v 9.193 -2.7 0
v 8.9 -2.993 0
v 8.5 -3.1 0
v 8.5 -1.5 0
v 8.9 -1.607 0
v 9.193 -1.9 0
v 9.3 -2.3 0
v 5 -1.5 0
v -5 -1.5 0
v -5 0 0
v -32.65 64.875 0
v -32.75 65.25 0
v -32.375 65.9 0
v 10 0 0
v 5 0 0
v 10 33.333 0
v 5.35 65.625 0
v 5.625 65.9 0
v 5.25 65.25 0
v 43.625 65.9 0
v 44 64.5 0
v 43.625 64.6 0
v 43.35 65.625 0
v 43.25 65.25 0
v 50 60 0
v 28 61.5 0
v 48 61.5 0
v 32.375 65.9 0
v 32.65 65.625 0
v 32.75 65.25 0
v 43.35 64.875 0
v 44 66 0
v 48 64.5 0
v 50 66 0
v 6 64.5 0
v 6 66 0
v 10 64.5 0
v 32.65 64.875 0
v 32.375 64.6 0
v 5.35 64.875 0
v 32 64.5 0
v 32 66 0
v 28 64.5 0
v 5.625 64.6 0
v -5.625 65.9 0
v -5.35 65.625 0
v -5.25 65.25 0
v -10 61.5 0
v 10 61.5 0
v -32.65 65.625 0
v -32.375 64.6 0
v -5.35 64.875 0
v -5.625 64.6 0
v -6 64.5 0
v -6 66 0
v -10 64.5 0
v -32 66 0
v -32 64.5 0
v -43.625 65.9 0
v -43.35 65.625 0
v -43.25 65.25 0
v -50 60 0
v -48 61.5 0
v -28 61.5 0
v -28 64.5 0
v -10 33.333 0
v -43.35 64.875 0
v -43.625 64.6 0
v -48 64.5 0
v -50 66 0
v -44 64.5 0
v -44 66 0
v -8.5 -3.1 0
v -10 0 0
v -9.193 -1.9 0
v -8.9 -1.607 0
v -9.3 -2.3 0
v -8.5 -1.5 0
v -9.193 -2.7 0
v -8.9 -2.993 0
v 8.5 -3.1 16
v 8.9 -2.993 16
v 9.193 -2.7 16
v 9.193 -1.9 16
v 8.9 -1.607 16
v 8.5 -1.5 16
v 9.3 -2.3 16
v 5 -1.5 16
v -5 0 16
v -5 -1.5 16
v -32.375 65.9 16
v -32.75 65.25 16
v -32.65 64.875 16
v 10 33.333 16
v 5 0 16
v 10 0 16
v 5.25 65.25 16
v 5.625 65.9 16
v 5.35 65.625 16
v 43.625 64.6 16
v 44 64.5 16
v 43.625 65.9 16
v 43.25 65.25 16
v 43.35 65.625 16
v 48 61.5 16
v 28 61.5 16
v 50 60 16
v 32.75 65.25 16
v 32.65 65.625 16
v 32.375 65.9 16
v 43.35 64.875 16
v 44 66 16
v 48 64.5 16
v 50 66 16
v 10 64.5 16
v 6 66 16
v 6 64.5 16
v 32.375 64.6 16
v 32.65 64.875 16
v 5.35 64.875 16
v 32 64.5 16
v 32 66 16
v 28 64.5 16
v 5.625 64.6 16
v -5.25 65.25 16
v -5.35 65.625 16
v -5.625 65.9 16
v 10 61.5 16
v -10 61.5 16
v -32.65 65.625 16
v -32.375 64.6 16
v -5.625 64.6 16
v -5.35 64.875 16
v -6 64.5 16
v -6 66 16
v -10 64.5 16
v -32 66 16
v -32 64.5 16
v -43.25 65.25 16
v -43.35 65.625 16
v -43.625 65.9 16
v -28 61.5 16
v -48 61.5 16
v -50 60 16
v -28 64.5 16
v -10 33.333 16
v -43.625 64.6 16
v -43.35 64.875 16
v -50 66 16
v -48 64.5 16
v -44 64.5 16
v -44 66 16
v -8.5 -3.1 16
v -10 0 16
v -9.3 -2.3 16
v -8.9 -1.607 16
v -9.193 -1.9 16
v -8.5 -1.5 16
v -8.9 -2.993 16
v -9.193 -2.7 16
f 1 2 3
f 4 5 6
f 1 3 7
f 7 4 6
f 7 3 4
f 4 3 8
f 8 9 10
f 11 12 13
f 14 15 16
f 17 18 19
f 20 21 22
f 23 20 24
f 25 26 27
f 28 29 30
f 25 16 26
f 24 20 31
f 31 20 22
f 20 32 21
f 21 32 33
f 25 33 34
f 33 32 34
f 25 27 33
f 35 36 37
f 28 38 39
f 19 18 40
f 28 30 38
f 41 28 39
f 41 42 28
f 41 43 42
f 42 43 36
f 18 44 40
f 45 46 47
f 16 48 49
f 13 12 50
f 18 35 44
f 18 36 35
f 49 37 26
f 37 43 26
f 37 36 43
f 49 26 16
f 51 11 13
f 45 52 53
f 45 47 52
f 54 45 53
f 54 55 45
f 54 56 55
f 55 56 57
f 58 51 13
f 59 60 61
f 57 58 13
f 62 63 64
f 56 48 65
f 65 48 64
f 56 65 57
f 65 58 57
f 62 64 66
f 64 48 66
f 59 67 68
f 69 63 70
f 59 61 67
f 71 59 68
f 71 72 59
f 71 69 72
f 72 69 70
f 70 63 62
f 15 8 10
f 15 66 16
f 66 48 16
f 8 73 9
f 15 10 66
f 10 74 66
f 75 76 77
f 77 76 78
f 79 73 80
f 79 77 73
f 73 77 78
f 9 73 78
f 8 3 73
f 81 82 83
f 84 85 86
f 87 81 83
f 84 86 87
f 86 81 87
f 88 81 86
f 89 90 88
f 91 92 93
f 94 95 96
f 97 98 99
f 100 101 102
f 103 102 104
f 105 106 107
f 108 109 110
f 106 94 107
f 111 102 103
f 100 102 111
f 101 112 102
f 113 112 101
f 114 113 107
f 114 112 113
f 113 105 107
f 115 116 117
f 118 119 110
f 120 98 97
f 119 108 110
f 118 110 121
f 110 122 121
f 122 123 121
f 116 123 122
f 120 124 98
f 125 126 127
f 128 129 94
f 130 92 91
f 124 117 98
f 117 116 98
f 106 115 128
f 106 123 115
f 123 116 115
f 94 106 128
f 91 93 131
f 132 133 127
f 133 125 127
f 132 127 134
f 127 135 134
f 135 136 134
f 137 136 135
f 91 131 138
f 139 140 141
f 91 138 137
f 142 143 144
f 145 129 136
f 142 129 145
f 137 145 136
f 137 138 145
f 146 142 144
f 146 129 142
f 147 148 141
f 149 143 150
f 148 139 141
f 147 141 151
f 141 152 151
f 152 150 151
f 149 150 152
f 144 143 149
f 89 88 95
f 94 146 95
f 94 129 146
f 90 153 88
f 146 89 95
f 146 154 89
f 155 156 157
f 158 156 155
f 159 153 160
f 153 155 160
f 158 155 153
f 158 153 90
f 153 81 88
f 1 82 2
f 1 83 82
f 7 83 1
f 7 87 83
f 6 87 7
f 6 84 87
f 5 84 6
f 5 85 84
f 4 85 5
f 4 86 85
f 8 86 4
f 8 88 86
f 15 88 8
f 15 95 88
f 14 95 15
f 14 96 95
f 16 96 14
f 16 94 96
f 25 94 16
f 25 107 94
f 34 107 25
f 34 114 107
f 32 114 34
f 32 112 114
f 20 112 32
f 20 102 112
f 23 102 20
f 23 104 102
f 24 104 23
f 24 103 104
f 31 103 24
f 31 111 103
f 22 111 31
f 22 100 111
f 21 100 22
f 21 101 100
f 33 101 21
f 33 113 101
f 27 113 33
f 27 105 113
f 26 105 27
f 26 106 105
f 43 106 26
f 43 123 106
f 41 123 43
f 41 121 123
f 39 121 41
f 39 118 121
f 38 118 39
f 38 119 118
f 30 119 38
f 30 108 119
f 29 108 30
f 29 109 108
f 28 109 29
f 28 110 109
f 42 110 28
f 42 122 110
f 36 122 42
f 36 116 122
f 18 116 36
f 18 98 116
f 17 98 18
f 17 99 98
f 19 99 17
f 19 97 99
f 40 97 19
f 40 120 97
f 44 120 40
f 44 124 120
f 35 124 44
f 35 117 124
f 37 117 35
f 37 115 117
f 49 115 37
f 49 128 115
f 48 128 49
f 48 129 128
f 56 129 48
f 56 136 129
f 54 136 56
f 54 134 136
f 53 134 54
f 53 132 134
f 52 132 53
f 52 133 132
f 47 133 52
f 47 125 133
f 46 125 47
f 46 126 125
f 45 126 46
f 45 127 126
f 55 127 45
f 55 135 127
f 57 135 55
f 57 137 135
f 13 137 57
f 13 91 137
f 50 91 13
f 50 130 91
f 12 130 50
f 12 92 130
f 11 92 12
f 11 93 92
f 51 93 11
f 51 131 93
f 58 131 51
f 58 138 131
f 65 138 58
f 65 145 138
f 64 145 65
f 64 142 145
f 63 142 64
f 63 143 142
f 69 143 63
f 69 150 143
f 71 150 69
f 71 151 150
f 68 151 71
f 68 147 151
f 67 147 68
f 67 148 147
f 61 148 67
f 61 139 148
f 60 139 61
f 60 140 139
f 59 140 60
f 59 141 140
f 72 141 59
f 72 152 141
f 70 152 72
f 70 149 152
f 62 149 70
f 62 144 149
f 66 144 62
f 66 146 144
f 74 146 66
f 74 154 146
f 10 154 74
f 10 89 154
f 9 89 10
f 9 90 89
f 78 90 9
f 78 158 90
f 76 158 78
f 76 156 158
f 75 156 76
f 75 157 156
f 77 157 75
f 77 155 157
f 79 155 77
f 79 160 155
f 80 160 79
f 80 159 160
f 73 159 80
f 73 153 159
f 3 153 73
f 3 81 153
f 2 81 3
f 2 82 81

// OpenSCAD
shi=16;
shoesize=[20,20];
tallboy(60);
module tallboy(h=160) {
  linear_extrude(shi,convexity=3) {
    mirror([0,1]) translate([0,-16.5,0]) male();
    translate([-10,0]) square([20,h]);
    translate([0,h]) difference() {
      hull() {
        translate([-50,0]) square([100,6]);
        translate([-5,-30]) square([10,5]);
      }
      translate([0,1.5]) female2();
      for(m=[0,1]) mirror([m,0]) translate([-38,1.5]) female2();
    }
  }
}
module double() {
  difference() {
    linear_extrude(shi,convexity=3) {
      difference(){
        union() {
          translate([0,12]) mirror([0,1]) male();
          hull() {
            rotate([0,0,30]) translate([12,-12]) square([6.5,24]);
            rotate([0,0,150]) translate([12,-12]) square([6.5,24]);
          }
        }
        translate([-7,-2]) square([14,8]);
        rotate([0,0,30]) translate([4,0]) female();
        rotate([0,0,150]) translate([4,0]) female();
      }
    }
    translate([0,30,shi/2]) rotate([90,0]) cylinder(d=25.4/4,h=60,$fn=30);
  }
}
module triple() {
difference() {
  linear_extrude(shi,convexity=3)
  difference() {
    union() {
      intersection() {
        circle(d=40,$fn=36);
        translate([-16,-16]) square([32,32]);
      }
      male();
    }
    for(r=[0,180]) rotate([0,0,r]) translate([1.5,0]) {
      female();
    }
    translate([-9,-12]) square([18,25]);
  }
  translate([0,30,shi/2]) rotate([90,0]) cylinder(d=25.4/4,h=60,$fn=30);
}
}
module male() {
  translate([-5,16]) square([10,2]);
  translate([-8.5,18.8]) hull() {
    circle(d=1.6,$fn=12);
    translate([17,0]) circle(d=1.6,$fn=12);
    *square([18,1.6]);
  }
}
module female2() {
  rotate([0,0,90]) translate([-10,0]) female();
}
module female() {
  difference() {
    translate([10,-6]) square([5.1,12]);
    translate([13.75,-6]) circle(d=1.5,$fn=12);
    translate([13.75,6]) circle(d=1.5,$fn=12);
  }
    hull() {
      translate([11,-8]) intersection() {
        *for(y=[-1,17]) translate([0,y])
          circle(r=1,$fn=20);
        translate([-1,-2]) square([1,20]);
      }
      translate([11,-10]) square([2,20]);
    }
}
/*
difference() {
  cube([200,30,3]);
  for(x=[8,172]) translate([x,-.01,-.01]) cube([shoesize[0]+.01,shoesize[1]+.01,4.02]);
}
translate([200/2-shoesize[0]/2,0,3]) cube([shoesize[0],shoesize[1],4]);
*/
